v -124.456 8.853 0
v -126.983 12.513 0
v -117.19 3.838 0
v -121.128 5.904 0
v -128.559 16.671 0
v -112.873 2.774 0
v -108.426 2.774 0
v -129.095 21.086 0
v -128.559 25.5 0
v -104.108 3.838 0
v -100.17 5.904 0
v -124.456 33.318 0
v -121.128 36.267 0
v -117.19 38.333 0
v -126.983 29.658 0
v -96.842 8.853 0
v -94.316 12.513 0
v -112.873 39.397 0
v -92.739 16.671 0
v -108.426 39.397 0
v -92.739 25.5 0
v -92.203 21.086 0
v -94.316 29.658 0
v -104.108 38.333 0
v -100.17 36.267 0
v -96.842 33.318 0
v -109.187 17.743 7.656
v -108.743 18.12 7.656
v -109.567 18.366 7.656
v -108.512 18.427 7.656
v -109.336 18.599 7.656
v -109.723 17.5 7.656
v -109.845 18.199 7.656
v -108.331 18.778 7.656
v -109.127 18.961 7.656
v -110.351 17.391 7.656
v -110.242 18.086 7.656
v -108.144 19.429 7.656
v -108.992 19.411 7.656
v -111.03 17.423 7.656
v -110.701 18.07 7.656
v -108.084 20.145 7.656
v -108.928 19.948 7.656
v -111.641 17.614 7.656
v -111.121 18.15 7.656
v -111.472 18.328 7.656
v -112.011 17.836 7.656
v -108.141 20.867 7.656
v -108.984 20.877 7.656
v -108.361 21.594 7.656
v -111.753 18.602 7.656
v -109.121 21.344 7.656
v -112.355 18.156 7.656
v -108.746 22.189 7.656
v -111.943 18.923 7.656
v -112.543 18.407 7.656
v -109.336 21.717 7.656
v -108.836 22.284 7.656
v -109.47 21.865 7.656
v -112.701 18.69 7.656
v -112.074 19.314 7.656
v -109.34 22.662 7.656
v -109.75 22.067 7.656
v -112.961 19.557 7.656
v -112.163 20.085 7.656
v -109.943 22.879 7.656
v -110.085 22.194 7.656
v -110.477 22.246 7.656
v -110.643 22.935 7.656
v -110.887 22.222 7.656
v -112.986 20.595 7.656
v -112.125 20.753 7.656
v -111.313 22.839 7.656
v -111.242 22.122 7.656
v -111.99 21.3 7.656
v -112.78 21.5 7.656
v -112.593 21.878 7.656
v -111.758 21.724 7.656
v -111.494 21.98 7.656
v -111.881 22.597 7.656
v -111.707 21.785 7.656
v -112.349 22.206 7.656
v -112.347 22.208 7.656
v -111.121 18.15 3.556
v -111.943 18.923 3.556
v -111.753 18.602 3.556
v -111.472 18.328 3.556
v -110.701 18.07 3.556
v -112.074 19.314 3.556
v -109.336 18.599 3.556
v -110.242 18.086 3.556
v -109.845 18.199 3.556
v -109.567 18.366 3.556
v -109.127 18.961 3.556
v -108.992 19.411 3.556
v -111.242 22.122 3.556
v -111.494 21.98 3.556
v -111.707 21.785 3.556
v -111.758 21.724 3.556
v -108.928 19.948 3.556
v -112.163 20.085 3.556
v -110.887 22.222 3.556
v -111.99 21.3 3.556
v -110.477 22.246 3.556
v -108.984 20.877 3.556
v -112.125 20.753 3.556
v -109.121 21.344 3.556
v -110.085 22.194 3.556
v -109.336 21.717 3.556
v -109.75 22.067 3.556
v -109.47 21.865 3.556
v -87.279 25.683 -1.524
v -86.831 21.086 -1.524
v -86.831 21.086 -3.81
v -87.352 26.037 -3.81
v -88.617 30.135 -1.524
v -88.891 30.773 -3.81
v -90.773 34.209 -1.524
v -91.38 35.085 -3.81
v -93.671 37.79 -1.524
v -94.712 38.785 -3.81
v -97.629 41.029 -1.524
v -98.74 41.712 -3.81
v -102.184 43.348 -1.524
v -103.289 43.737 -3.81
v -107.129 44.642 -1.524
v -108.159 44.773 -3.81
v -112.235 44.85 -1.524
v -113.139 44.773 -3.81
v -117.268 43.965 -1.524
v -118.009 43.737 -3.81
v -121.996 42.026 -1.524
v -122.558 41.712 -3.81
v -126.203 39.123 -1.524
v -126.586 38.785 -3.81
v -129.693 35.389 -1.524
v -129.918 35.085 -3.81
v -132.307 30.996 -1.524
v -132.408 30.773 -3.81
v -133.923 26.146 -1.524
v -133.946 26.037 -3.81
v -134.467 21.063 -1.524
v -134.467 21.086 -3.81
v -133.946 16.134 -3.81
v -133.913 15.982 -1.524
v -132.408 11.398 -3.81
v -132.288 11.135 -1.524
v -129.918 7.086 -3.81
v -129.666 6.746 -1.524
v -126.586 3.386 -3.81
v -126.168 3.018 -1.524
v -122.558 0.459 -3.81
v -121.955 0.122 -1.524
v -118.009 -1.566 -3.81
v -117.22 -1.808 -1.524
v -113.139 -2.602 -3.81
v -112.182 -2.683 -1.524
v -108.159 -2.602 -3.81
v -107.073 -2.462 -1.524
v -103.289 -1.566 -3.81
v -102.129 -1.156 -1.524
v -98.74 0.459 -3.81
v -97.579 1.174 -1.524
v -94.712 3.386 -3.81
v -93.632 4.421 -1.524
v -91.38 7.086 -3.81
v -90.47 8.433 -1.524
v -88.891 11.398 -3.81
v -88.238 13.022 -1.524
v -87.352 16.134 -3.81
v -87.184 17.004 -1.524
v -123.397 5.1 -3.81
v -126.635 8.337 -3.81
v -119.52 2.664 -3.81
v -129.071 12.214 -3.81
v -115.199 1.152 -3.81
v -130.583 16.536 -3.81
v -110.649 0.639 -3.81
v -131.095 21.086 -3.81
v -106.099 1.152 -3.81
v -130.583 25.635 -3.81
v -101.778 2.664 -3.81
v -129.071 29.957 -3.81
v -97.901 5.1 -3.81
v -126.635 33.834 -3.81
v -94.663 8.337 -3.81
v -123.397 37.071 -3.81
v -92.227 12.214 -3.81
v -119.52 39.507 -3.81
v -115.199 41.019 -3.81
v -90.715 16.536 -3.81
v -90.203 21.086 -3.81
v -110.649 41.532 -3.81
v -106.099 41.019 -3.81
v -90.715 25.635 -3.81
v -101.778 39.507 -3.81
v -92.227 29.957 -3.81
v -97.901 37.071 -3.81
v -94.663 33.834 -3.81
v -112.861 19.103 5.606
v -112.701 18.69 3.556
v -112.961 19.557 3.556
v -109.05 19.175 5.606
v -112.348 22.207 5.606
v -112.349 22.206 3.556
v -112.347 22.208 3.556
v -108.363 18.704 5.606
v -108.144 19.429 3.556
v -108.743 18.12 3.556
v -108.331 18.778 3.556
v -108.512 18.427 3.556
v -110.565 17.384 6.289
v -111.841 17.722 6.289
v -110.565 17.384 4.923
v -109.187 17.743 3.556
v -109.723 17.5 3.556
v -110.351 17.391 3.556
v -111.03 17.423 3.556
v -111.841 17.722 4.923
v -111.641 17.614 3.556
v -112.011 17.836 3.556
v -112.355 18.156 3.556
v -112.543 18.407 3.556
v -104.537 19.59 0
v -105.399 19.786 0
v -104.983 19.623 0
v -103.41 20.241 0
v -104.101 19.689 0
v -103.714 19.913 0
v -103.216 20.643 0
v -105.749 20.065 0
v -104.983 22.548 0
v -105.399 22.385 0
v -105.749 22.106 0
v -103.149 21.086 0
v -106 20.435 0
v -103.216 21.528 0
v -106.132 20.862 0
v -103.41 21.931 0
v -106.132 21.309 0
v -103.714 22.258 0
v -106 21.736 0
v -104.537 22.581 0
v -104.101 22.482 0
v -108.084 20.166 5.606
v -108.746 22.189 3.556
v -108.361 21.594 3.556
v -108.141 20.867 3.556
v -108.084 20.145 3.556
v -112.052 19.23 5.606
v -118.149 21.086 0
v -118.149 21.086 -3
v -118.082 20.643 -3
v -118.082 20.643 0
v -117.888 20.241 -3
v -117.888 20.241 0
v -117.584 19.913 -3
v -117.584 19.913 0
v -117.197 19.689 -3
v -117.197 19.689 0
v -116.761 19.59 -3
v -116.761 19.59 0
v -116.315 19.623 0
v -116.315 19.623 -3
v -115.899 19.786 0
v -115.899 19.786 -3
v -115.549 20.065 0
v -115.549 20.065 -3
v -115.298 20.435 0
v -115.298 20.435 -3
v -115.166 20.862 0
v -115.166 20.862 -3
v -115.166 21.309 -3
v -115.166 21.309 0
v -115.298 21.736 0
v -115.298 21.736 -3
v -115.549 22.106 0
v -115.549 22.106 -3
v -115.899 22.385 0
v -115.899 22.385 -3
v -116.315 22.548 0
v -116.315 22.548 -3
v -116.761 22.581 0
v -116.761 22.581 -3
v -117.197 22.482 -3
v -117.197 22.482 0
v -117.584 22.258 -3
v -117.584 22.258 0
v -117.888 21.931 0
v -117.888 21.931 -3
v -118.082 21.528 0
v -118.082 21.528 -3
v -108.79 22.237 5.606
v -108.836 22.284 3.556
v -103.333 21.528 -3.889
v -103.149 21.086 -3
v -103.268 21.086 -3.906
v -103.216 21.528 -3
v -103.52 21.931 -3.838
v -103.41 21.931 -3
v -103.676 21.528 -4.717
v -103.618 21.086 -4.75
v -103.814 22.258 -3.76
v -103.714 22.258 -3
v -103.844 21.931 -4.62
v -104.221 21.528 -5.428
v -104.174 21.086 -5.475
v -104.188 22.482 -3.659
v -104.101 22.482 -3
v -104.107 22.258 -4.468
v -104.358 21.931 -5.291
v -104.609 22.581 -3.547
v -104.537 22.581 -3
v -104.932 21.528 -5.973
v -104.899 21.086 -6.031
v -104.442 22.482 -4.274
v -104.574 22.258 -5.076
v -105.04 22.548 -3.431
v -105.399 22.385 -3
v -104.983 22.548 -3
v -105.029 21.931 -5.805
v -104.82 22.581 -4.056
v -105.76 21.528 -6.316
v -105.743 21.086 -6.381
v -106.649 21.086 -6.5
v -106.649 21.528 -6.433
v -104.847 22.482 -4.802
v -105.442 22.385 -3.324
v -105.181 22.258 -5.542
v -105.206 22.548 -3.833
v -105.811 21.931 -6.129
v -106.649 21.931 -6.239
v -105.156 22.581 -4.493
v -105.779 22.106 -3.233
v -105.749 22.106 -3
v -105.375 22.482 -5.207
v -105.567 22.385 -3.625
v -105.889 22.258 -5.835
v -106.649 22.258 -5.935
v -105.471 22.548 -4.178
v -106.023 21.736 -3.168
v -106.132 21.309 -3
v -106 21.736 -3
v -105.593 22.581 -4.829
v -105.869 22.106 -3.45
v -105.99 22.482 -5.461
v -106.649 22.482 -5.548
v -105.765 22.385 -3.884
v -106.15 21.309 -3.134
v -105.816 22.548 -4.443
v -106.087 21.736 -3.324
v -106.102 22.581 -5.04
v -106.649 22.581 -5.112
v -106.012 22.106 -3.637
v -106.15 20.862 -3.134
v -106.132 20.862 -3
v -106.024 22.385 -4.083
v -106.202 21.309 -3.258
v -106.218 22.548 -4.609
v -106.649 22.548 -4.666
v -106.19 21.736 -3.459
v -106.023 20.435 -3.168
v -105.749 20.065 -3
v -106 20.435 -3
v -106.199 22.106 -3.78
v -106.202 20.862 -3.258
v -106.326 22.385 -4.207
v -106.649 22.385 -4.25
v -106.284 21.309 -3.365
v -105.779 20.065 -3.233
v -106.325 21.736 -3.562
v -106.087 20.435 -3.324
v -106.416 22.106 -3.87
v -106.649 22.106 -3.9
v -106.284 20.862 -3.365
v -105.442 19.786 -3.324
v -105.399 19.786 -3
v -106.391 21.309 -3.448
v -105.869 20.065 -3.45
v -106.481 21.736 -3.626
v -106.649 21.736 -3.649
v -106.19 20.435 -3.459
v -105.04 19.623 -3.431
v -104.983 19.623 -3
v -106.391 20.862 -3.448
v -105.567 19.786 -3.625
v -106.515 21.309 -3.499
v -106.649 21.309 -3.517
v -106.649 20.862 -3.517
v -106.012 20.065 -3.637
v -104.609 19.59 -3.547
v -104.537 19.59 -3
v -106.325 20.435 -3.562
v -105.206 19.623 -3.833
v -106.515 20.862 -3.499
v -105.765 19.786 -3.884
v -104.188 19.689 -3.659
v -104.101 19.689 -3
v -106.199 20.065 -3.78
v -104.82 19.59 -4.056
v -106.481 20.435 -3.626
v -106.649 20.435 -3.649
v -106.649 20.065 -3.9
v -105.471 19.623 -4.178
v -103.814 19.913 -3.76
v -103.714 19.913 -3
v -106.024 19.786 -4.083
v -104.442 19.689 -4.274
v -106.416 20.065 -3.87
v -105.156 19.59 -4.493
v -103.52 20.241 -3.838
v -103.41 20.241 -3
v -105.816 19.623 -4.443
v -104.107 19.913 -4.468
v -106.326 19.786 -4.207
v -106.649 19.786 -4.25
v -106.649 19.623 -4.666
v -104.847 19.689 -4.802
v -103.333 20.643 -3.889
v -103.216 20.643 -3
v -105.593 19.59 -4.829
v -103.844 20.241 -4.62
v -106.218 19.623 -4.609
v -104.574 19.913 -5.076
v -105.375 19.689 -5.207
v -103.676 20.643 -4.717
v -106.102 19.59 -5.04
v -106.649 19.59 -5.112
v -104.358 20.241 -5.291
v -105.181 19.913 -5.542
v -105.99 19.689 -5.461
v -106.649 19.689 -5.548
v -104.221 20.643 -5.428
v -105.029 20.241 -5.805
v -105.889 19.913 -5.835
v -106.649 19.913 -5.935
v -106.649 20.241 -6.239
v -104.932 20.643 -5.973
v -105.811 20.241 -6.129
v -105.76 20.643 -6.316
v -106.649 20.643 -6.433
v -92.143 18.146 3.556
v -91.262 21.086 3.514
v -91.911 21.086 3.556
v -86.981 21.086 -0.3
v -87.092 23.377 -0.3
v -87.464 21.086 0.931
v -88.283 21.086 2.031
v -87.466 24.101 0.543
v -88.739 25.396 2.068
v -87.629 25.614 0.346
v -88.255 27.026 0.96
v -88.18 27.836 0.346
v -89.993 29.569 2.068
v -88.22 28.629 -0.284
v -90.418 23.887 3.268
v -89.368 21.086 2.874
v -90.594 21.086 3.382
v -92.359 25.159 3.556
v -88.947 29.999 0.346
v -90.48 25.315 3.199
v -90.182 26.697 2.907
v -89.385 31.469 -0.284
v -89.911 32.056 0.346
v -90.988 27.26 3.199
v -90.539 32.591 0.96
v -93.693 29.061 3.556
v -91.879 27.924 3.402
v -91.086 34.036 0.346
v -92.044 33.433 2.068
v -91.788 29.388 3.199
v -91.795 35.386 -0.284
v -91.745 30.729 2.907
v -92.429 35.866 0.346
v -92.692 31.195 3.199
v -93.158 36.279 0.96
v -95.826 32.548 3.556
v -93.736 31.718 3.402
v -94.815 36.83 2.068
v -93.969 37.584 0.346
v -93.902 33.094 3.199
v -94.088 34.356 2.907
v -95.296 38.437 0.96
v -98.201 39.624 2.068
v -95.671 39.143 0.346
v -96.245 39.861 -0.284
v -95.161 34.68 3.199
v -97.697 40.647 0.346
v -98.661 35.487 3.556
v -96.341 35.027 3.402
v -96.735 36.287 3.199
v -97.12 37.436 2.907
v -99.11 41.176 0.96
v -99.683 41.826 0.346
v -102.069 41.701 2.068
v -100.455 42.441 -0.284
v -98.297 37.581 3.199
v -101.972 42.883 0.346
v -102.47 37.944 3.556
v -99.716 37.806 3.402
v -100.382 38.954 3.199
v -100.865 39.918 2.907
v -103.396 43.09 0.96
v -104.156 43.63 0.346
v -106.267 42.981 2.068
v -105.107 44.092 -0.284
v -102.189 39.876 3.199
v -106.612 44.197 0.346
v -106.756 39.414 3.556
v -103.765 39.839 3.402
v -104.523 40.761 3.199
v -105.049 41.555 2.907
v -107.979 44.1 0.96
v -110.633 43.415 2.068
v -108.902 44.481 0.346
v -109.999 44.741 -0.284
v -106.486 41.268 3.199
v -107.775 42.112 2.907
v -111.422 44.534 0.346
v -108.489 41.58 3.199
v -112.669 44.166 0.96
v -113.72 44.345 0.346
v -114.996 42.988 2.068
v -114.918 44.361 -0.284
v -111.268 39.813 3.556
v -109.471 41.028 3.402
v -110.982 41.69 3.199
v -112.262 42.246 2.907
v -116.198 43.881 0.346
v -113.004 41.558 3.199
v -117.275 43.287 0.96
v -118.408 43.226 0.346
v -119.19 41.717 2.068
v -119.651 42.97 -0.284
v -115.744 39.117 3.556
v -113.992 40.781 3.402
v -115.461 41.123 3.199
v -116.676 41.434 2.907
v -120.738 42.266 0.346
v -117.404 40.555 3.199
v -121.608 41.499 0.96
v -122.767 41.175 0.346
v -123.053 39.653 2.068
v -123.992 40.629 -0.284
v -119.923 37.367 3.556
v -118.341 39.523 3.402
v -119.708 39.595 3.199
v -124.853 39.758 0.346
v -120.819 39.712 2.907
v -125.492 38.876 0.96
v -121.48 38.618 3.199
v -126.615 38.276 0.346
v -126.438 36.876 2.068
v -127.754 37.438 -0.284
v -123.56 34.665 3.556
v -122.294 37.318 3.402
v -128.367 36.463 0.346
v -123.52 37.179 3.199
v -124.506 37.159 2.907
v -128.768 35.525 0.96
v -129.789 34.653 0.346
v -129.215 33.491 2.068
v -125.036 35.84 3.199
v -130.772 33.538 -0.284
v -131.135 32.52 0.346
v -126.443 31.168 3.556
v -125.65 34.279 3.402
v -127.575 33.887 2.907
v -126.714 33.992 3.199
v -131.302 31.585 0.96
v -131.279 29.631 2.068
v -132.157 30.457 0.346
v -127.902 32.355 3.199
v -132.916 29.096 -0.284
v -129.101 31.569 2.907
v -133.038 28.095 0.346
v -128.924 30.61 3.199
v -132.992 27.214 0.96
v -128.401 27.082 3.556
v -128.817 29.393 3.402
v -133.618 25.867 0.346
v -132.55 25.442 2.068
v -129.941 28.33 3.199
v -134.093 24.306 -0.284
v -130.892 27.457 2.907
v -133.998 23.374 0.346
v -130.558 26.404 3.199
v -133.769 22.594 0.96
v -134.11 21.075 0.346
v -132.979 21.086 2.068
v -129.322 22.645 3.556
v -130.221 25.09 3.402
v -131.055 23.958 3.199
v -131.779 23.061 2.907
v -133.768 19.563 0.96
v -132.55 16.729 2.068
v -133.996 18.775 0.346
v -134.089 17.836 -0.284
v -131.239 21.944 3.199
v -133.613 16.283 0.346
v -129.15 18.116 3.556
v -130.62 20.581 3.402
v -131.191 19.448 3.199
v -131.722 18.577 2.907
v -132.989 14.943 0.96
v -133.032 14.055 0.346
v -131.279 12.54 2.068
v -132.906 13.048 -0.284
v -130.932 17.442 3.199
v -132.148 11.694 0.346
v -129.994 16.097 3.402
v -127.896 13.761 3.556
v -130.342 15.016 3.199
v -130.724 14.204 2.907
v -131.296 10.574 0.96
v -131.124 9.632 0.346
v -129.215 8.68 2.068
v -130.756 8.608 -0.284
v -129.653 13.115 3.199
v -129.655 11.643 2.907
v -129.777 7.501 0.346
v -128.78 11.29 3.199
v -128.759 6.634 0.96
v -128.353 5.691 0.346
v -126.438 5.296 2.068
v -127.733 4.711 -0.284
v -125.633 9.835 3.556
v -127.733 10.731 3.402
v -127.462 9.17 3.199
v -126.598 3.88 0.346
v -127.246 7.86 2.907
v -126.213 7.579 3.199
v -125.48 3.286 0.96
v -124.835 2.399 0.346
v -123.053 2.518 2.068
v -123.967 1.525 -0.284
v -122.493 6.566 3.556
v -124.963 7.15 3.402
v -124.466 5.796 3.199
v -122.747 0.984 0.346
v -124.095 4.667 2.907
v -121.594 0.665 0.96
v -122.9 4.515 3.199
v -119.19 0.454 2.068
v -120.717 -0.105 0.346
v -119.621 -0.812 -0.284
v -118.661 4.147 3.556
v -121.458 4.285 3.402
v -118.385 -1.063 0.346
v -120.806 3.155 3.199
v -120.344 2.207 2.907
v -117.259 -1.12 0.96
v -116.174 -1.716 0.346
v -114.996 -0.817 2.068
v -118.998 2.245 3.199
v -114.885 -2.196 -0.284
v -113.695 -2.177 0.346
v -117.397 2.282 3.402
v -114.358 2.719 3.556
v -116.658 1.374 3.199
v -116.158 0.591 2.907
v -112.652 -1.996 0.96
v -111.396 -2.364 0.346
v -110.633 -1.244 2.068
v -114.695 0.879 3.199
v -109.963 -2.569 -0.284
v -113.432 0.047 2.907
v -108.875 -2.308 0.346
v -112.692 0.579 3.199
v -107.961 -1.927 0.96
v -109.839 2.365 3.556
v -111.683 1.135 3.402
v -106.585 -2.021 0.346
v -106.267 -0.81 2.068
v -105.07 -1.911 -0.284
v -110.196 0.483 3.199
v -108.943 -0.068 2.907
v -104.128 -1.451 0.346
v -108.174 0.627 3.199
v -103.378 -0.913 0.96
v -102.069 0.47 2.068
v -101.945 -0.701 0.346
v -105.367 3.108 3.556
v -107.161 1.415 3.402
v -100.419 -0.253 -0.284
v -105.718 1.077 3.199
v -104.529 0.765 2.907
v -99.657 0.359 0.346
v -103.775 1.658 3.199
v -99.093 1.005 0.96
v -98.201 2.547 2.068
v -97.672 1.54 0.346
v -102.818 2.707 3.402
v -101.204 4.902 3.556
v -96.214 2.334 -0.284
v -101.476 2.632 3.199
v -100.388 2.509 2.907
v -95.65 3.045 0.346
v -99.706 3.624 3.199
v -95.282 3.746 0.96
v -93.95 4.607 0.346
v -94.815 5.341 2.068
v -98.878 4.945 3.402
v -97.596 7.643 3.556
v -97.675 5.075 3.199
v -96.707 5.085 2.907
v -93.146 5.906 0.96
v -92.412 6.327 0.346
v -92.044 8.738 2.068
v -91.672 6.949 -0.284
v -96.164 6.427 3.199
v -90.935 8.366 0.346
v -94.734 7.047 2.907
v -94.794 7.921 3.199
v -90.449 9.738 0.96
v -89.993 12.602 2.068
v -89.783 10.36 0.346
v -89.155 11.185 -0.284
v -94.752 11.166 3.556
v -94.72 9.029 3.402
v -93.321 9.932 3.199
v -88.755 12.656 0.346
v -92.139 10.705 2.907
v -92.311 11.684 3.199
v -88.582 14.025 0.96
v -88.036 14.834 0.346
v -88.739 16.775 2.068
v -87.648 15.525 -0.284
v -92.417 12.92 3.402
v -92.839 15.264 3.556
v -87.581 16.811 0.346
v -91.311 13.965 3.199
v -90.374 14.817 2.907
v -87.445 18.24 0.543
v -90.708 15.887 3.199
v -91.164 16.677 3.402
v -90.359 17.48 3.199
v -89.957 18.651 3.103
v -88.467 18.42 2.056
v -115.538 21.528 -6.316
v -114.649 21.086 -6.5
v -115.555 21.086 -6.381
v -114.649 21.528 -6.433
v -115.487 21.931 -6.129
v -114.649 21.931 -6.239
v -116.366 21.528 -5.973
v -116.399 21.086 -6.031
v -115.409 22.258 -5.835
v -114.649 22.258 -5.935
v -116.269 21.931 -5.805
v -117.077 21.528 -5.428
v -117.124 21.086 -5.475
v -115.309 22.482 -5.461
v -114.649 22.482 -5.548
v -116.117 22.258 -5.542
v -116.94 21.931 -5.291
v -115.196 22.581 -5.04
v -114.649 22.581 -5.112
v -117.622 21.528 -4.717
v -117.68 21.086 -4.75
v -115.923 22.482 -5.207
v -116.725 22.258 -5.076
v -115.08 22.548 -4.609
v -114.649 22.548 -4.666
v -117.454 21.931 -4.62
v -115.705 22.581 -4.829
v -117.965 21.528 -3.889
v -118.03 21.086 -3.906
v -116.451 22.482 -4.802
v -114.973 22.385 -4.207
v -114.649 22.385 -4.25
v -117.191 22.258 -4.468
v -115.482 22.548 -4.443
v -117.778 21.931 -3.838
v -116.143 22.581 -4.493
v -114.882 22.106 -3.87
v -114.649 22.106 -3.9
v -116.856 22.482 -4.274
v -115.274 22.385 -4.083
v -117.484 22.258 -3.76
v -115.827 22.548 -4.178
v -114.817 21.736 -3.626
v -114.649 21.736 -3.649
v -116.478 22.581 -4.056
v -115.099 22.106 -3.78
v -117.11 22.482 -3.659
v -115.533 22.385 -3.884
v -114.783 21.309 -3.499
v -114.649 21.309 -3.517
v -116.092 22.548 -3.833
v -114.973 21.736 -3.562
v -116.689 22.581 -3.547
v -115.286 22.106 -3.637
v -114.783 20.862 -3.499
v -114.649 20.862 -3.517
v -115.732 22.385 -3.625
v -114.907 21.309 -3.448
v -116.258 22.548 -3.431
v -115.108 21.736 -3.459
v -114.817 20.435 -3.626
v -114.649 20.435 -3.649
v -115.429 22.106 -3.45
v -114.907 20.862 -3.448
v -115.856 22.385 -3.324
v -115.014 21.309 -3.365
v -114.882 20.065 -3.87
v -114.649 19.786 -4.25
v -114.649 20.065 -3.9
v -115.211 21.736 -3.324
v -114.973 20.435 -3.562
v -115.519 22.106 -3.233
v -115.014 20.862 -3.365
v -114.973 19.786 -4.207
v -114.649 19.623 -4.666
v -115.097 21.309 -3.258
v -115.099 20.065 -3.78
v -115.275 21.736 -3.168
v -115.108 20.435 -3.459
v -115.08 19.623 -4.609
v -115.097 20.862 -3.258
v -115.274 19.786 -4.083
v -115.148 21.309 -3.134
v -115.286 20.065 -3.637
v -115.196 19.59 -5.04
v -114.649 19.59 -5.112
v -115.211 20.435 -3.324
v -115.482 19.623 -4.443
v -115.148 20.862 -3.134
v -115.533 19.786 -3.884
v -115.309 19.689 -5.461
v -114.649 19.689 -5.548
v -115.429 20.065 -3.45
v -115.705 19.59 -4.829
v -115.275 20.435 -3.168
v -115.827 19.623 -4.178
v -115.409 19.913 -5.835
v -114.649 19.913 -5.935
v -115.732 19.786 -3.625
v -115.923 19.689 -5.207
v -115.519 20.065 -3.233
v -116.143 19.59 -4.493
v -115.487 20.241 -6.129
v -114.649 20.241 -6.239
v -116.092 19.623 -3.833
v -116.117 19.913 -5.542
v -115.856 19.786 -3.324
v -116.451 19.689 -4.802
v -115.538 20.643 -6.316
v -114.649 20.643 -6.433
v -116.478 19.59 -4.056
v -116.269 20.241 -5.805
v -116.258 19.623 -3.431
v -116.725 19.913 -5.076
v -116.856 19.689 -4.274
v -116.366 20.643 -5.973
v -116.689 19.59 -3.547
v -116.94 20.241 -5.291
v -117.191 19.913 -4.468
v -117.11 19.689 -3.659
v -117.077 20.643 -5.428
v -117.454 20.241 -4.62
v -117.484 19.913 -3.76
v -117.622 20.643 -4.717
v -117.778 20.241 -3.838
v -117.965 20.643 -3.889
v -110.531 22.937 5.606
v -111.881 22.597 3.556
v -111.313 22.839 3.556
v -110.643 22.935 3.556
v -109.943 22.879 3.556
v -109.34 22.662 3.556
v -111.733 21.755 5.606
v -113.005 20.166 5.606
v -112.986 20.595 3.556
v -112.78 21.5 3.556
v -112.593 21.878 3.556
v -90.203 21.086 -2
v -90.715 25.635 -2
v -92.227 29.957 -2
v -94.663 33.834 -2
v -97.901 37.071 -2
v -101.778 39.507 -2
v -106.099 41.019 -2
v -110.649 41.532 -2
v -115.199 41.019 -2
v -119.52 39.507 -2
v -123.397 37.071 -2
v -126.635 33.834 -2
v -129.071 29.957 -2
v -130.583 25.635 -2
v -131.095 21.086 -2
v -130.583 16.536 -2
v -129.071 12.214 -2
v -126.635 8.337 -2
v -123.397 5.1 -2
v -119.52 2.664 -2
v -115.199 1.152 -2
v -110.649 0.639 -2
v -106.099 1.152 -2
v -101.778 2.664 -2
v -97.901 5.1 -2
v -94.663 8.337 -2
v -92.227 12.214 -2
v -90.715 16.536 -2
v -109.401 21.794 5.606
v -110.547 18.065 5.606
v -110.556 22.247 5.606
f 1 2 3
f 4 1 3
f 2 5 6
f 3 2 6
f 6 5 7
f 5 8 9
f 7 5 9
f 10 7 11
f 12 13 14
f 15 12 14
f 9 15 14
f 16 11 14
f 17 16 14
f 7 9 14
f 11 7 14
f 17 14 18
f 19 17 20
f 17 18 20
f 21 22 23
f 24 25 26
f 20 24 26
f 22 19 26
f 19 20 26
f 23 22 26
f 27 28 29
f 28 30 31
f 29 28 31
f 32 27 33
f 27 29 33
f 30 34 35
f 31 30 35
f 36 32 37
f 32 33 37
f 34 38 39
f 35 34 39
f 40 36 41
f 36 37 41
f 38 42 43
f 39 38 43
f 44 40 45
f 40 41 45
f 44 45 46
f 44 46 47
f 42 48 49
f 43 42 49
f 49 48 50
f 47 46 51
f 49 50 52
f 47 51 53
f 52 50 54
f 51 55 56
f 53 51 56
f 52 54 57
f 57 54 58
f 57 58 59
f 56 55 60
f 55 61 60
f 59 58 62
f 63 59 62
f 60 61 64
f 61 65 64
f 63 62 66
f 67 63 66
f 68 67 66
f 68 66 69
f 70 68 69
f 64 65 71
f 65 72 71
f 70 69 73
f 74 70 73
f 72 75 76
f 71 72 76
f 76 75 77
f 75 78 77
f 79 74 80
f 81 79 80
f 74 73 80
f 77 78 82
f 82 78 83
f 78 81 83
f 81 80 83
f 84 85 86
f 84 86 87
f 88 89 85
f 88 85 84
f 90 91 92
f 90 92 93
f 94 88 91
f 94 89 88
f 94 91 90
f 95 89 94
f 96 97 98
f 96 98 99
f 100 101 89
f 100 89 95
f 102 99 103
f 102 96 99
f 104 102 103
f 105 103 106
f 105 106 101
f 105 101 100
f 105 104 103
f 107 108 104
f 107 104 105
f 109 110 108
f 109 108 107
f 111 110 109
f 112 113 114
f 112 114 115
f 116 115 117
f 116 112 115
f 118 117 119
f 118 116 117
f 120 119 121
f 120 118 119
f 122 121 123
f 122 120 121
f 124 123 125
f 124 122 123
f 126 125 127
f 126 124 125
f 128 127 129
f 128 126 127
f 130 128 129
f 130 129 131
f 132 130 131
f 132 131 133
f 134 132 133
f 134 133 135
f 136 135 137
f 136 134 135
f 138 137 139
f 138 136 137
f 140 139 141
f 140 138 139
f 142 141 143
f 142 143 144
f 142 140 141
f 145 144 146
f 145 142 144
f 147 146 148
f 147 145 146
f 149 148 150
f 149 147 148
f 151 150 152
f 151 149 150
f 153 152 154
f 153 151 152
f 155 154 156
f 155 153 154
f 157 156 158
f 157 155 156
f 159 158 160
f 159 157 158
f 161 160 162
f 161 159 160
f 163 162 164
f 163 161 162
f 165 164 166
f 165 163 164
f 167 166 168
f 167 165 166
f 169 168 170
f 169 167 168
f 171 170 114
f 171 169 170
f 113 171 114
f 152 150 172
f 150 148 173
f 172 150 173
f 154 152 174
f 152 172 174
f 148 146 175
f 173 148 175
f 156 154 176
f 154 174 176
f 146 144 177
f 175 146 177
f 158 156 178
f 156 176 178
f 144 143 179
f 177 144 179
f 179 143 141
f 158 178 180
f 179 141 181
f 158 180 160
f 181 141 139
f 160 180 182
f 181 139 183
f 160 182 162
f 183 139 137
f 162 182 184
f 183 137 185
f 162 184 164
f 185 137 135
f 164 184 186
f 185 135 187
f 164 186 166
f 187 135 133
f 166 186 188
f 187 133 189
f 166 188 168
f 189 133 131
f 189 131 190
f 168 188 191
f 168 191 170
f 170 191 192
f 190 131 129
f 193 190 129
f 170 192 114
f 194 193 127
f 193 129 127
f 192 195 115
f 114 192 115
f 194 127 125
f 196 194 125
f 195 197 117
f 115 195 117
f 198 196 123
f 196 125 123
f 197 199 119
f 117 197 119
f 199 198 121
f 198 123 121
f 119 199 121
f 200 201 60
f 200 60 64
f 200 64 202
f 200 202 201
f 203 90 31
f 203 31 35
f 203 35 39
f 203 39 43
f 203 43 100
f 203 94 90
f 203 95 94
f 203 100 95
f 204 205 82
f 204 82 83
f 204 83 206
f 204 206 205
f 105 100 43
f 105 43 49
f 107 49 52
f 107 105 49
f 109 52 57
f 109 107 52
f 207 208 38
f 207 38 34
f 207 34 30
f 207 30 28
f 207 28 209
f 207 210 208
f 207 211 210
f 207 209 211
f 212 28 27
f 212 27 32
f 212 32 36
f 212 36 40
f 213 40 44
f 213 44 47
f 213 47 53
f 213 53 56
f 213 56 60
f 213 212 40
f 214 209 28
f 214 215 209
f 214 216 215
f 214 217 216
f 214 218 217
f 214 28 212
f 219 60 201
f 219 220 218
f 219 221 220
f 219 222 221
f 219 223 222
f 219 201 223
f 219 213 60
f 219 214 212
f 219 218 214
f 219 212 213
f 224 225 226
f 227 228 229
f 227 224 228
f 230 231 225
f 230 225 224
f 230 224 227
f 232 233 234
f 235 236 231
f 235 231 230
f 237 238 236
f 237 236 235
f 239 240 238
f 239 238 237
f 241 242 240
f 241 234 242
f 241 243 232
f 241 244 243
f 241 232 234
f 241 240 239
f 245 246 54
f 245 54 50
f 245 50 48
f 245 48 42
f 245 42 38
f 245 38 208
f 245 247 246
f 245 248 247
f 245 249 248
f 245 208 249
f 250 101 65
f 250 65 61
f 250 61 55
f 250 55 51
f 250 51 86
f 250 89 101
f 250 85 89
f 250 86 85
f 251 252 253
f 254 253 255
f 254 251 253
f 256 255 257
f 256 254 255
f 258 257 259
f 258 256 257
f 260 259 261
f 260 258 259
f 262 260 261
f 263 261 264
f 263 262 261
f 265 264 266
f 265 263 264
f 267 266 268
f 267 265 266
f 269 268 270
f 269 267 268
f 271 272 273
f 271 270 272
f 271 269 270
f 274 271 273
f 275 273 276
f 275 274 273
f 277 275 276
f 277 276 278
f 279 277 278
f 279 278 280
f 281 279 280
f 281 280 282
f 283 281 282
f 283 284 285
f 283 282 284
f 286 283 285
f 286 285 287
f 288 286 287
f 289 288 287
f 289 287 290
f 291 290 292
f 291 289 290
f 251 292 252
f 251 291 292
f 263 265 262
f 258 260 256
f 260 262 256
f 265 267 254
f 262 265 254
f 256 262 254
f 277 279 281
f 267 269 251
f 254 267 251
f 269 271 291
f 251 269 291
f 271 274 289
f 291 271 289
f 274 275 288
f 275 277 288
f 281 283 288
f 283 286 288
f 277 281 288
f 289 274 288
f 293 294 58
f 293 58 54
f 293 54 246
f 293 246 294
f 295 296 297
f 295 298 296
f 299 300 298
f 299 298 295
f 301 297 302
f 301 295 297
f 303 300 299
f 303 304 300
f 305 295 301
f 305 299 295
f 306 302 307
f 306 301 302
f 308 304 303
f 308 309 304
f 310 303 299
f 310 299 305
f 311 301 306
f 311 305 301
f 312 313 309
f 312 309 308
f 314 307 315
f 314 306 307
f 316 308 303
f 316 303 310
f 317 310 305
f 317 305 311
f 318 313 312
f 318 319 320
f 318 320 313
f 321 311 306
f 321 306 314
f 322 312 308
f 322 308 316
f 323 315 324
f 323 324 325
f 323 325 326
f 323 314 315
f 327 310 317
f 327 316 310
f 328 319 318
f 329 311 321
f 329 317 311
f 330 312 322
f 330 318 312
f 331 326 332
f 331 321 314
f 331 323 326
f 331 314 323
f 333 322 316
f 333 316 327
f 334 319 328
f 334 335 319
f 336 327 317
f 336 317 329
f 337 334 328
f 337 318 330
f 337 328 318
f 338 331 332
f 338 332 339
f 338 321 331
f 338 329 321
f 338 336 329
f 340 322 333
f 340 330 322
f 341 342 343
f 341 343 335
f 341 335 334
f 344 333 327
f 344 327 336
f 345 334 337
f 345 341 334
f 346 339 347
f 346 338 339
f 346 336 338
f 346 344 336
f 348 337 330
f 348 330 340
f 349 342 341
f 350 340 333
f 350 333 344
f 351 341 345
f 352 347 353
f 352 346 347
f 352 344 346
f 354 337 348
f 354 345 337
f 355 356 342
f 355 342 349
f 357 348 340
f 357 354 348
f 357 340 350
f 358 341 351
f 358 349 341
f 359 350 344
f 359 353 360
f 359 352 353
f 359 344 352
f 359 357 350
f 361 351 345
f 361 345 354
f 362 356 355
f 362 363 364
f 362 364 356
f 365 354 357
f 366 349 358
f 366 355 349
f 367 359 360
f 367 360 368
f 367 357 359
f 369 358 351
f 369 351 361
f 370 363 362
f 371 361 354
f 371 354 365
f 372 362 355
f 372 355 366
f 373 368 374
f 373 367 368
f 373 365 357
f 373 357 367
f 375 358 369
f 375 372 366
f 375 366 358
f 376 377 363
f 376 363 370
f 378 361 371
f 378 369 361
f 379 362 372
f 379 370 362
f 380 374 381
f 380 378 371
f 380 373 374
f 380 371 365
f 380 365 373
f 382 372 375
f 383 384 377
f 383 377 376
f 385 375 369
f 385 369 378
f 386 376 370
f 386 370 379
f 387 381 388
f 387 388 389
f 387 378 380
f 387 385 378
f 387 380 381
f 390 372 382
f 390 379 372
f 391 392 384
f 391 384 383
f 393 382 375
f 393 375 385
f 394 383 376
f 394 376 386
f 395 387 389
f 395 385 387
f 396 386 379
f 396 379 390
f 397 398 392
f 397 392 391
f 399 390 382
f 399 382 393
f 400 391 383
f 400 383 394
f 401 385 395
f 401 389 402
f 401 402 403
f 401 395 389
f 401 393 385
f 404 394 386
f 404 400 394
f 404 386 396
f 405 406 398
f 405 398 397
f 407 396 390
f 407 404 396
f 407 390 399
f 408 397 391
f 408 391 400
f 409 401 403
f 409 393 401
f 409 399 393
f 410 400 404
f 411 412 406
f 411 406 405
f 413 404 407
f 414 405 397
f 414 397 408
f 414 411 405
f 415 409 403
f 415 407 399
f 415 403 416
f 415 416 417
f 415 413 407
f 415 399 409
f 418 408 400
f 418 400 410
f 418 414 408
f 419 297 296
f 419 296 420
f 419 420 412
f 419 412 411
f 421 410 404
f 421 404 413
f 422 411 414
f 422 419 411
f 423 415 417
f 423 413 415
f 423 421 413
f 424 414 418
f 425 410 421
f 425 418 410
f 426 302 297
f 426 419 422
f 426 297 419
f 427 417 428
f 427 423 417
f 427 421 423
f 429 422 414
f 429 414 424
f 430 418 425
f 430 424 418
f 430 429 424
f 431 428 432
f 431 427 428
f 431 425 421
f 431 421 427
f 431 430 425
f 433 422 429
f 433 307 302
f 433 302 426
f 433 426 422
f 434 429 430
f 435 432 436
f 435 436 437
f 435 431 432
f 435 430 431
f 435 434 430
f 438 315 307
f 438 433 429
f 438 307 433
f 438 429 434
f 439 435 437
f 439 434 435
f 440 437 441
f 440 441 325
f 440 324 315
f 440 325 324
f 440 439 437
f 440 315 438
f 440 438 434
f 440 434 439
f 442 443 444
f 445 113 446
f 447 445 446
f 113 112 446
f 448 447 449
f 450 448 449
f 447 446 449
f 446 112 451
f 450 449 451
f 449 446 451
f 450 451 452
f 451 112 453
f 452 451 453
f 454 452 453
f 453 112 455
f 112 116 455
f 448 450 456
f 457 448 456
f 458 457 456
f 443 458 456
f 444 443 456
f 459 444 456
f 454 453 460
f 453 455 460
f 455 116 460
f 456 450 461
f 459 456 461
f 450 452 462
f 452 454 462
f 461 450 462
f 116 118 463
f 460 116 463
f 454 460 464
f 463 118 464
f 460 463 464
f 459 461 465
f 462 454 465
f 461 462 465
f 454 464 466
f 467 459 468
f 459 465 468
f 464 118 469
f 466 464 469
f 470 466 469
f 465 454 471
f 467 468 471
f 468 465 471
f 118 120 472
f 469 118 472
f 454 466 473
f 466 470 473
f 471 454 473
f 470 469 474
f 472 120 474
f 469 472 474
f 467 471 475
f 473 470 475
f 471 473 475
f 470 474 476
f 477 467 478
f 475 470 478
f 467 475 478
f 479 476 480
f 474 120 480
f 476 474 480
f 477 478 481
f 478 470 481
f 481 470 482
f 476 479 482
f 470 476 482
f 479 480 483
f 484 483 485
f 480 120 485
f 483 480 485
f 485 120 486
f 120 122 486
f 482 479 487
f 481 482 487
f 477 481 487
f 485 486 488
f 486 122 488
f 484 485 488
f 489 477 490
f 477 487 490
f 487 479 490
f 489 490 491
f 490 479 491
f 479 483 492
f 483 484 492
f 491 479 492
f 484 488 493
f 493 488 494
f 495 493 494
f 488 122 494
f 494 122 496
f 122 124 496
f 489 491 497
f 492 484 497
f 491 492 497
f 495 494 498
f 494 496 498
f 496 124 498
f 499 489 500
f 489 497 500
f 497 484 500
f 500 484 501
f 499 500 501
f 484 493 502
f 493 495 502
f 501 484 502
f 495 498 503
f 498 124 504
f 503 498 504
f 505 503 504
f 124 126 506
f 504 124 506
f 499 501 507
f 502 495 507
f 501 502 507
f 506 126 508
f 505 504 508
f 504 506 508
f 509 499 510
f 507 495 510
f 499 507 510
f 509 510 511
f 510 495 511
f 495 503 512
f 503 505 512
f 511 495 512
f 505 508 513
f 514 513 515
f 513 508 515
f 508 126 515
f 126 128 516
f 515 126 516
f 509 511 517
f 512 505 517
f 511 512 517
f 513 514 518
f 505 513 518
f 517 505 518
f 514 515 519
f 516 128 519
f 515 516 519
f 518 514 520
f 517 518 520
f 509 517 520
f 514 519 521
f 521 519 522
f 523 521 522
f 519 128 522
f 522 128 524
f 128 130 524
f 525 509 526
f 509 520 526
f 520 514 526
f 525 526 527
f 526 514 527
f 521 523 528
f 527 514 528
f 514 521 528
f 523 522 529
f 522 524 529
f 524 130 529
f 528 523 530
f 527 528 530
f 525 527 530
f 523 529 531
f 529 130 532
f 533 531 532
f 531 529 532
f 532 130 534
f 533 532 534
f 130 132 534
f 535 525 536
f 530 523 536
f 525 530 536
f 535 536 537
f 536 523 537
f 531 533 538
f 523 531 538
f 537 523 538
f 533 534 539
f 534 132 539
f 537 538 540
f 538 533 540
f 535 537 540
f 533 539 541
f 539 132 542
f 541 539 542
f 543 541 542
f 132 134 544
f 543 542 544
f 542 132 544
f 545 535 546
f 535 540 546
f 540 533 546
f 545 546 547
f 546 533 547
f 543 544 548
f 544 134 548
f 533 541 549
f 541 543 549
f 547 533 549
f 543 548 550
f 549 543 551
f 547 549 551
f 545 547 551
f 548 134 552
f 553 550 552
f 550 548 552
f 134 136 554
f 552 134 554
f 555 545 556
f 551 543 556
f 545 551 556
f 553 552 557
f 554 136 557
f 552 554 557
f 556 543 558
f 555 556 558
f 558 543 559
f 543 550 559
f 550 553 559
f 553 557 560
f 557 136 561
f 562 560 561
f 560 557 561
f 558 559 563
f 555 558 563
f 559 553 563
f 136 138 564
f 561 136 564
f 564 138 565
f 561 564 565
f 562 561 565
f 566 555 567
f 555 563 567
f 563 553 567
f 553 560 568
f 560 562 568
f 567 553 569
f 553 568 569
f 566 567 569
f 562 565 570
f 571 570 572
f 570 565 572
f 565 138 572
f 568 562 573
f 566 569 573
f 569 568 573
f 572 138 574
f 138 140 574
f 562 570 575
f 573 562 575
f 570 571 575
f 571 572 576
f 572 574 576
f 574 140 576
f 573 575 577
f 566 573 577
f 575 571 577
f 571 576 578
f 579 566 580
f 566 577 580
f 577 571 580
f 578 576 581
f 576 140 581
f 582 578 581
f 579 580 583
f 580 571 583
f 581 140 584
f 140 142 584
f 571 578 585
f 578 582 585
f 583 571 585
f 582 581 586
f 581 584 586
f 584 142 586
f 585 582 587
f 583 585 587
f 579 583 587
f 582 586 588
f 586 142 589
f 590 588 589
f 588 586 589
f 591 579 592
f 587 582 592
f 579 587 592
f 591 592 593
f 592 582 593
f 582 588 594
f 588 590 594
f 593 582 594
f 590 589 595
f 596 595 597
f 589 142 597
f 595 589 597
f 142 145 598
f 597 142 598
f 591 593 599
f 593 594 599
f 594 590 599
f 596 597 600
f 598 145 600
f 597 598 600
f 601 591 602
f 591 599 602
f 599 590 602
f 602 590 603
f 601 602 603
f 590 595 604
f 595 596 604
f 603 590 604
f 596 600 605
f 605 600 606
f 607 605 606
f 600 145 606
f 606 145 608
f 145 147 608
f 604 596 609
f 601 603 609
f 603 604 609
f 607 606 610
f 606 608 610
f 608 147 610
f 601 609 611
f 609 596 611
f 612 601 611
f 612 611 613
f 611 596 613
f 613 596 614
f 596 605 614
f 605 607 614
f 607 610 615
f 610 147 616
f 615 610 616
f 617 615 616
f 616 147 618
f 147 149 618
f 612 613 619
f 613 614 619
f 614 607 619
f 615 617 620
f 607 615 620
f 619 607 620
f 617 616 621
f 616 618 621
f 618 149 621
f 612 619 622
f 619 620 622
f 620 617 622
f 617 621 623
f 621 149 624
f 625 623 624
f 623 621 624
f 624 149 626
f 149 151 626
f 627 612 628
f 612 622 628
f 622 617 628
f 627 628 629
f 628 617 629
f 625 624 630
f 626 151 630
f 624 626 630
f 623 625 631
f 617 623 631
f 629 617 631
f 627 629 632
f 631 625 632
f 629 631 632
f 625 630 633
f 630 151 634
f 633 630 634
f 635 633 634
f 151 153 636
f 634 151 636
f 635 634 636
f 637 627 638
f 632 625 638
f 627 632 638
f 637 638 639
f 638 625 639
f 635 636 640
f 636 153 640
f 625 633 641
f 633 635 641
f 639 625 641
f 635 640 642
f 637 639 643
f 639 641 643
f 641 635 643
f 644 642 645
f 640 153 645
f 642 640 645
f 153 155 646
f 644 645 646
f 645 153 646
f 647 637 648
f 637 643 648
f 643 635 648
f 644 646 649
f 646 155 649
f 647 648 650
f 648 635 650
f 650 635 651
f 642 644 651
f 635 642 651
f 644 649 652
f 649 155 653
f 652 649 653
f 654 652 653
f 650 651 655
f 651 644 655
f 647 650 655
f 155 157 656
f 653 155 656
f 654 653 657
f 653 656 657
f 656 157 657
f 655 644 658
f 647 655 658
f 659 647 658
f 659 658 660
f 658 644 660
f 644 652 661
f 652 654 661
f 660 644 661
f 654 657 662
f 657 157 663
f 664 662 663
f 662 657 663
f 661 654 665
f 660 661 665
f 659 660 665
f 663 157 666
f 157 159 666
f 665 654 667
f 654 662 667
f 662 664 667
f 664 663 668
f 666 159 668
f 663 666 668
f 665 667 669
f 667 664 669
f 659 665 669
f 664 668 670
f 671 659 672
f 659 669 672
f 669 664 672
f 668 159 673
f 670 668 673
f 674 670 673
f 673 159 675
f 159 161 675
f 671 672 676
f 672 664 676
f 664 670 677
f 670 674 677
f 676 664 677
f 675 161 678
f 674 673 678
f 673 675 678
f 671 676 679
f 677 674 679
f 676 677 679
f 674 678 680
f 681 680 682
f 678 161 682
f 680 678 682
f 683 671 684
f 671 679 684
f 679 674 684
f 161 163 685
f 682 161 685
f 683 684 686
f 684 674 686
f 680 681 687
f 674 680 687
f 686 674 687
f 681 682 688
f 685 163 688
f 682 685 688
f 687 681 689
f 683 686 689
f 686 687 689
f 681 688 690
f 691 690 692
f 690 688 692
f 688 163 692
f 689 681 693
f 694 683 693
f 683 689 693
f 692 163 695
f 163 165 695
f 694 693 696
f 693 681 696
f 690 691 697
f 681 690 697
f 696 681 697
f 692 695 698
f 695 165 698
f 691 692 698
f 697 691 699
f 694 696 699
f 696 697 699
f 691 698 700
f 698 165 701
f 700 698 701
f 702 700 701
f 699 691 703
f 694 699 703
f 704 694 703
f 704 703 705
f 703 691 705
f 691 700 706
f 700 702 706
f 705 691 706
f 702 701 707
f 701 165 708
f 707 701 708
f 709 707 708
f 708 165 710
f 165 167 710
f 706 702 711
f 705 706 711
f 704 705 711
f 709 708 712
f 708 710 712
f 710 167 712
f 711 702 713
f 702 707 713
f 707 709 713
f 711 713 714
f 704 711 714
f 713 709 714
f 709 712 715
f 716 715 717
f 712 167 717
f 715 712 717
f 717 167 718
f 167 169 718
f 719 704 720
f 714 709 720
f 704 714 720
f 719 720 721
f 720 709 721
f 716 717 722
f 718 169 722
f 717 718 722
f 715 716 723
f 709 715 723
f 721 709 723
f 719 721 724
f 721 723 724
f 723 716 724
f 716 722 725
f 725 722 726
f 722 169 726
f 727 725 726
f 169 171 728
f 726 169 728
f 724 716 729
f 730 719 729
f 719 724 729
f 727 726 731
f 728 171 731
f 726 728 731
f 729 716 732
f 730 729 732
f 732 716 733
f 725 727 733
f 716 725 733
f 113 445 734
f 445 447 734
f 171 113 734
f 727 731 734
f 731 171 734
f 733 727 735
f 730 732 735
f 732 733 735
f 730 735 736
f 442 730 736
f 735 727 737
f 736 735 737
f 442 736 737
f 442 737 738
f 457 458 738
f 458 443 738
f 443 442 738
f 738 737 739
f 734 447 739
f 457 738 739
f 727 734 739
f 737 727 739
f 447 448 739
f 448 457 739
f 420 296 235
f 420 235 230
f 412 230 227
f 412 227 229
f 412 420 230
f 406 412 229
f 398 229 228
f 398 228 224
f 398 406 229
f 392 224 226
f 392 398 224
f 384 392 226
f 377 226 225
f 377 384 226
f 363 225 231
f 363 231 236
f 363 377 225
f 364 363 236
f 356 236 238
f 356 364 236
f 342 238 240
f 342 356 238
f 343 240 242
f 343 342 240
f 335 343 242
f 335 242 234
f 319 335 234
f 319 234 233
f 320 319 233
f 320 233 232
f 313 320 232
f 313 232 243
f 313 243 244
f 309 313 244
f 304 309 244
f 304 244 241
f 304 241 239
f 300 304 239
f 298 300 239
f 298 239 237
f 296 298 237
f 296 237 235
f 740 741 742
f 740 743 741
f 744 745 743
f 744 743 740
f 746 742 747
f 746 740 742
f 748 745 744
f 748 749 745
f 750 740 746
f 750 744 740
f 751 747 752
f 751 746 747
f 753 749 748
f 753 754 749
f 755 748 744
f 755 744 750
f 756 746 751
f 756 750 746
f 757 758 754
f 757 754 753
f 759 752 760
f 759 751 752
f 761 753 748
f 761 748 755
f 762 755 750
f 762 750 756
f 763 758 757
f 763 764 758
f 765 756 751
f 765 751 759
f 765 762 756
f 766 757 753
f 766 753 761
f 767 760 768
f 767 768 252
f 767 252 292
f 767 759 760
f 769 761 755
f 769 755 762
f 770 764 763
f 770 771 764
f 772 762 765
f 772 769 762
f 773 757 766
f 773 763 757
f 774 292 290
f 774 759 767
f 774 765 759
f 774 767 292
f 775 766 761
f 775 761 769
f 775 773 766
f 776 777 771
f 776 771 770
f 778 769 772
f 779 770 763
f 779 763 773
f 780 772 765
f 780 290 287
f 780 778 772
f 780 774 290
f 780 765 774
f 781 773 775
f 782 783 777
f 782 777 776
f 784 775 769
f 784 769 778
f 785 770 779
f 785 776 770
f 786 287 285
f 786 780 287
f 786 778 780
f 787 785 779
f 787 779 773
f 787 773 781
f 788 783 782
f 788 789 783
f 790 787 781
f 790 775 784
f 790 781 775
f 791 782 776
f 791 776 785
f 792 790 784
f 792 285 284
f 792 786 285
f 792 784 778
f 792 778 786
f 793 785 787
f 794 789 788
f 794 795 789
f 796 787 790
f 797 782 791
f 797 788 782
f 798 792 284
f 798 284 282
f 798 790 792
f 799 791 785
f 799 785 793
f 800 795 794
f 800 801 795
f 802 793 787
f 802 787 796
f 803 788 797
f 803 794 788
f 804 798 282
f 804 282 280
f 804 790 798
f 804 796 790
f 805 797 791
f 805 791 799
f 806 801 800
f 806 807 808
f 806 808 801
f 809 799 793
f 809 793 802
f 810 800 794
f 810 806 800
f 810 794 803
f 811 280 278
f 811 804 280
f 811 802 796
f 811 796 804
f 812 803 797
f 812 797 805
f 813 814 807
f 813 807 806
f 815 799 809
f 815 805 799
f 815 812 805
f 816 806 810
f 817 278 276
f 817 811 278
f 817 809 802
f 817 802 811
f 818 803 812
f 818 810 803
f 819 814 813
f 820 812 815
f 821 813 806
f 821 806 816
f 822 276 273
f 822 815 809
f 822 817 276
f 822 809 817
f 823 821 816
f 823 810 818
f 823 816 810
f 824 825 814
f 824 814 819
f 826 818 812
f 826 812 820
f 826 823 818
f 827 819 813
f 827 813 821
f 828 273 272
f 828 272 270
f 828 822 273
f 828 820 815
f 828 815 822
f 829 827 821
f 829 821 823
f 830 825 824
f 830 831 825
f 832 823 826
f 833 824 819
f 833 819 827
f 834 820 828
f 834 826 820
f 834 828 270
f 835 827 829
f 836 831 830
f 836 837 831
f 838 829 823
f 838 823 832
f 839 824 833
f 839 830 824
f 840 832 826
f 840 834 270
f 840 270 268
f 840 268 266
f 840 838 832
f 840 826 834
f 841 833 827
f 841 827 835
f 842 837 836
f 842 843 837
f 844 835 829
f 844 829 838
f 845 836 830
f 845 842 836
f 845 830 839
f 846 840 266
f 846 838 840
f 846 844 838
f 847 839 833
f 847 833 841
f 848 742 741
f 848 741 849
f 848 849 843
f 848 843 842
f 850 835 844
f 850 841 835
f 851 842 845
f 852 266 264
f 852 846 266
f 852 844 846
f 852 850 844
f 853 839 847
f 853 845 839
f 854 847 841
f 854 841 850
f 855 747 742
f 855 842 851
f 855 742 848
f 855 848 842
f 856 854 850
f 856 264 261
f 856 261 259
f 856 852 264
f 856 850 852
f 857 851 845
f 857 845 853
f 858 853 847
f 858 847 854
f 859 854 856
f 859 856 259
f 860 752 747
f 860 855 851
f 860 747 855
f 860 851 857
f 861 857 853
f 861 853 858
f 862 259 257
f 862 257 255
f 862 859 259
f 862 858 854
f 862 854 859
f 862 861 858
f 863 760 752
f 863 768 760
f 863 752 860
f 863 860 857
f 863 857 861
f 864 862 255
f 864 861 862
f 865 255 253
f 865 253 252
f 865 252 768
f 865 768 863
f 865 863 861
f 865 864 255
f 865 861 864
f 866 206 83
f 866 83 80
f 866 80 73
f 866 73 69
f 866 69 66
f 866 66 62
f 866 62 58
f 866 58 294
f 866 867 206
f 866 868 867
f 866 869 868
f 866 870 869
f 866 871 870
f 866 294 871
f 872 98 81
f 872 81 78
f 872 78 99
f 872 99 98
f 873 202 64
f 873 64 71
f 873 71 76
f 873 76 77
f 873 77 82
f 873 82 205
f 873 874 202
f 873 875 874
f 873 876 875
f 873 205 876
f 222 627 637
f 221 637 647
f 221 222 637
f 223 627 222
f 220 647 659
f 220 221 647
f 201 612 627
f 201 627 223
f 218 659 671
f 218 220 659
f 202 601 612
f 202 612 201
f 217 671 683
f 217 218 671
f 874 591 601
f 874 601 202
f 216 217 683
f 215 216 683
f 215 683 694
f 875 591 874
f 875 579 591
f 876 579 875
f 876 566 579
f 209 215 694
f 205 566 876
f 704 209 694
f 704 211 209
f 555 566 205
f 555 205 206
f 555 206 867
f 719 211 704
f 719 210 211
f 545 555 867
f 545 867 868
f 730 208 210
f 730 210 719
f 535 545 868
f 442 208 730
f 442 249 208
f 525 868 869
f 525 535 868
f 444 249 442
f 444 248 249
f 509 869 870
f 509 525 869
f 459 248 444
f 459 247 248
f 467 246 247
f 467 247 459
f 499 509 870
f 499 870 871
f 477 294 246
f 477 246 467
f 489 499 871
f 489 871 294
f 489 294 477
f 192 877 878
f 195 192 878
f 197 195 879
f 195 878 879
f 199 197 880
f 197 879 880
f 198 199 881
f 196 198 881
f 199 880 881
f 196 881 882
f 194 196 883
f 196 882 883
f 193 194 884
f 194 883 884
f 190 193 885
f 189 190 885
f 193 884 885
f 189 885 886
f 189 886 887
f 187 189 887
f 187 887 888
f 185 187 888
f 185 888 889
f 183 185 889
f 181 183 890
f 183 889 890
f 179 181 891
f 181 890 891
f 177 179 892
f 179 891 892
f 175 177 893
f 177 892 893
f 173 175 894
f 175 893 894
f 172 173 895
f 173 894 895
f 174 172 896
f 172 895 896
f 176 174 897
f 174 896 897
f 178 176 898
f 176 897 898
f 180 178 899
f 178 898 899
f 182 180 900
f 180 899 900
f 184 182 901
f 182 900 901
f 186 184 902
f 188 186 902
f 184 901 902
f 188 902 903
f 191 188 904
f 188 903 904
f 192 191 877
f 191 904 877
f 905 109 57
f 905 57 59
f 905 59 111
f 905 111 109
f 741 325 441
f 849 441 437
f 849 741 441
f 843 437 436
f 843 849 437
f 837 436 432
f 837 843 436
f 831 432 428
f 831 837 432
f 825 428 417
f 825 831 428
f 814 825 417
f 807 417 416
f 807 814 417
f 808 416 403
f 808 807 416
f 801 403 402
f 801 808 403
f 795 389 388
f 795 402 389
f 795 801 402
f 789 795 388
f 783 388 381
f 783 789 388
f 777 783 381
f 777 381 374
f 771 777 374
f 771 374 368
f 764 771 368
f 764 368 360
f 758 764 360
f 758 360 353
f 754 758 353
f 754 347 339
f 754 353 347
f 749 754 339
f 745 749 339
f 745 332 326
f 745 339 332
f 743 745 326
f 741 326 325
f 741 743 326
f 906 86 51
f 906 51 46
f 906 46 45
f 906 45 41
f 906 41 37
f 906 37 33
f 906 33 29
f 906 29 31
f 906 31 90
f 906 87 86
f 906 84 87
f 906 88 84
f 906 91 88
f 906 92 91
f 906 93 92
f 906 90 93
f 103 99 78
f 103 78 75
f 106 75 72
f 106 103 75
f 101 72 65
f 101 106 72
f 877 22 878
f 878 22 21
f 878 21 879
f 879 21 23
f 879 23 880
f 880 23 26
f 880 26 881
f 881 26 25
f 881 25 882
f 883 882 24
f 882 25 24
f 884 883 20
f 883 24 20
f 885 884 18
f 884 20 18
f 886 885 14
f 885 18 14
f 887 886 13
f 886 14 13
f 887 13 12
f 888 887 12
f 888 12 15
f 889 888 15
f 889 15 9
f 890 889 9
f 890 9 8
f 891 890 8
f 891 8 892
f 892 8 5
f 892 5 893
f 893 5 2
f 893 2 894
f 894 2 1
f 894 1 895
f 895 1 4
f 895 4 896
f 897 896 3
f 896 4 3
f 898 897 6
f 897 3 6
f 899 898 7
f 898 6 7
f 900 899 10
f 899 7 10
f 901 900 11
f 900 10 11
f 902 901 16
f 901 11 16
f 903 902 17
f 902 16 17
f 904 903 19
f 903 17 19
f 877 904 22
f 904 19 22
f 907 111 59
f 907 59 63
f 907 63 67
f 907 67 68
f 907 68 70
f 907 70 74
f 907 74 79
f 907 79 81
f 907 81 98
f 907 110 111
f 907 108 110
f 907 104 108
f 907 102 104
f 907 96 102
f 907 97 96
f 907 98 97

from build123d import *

# Parameters (mm, degrees)
F0_R      = 23.8176620727
F0_R_2    = 20.4464074417
F1_DEPTH  = 3.81
F2_DEPTH  = 3.556
F3_DEPTH  = 3.556
F5_R      = 5.08
F6_SIZE   = 2
F9_R      = 1.5
F12_DEPTH = 4.1


with BuildPart() as f1:
    # F0 (on Top) → F1 (new body)
    with BuildSketch(Plane.XY):
        with Locations((-110.6490343809, 21.0855230689)):
            Circle(F0_R)
        with Locations((-110.6490343809, 21.0855230689)):
            Circle(F0_R_2, mode=Mode.SUBTRACT)
    extrude(amount=-F1_DEPTH)


with BuildPart() as f2:
    # F0 (on Top) → F2 (new body)
    with BuildSketch(Plane.XY):
        with Locations((-110.6490343809, 21.0855230689)):
            Circle(F0_R_2)
    extrude(amount=F2_DEPTH)


with BuildPart() as f3:
    # F0 (on Top) → F3 (new body)
    with BuildSketch(Plane.XY):
        with Locations((-110.6490343809, 21.0855230689)):
            Circle(F0_R)
        with Locations((-110.6490343809, 21.0855230689)):
            Circle(F0_R_2, mode=Mode.SUBTRACT)
    extrude(amount=F3_DEPTH)


with BuildPart() as f1_1:
    add(f1.part)

    # F4: union F2, F3
    add(f2.part)
    add(f3.part)

    # F5
    f5_edges = [f1_1.edges().sort_by_distance(p)[0] for p in [
        (-134.466696, 21.085523, 3.556),
    ]]
    fillet(f5_edges, radius=F5_R)

    # F6
    f6_edges = [f1_1.edges().sort_by_distance(p)[0] for p in [
        (-131.095442, 21.085523, 0),
    ]]
    chamfer(f6_edges, length=F6_SIZE)

    # F11 (on face) → F12 (join)
    with BuildSketch(Plane.XY.offset(3.556)):
        with BuildLine():
            add(Edge.make_bspline(
                [(-112.3472333381, 22.208395905), (-111.6923218171, 22.9368774647), (-110.5309792653, 22.9368774647)],
                knots=[0.0017264962, 0.0017264962, 0.0017264962, 1, 1, 1], degree=2))
            Line((-112.3472333381, 22.208395905), (-111.7074051084, 21.7853325556))
            add(Edge.make_bspline(
                [(-110.5559975679, 22.247310498), (-111.3039935604, 22.247310498), (-111.7074051084, 21.7853325556)],
                knots=[0, 0, 0, 0.9398177205, 0.9398177205, 0.9398177205], degree=2))
            add(Edge.make_bspline(
                [(-109.4699325004, 21.8651616778), (-109.8709274196, 22.247310498), (-110.5559975679, 22.247310498)],
                knots=[0.150922206, 0.150922206, 0.150922206, 1, 1, 1], degree=2))
            Line((-109.4699325004, 21.8651616778), (-108.8357851326, 22.2844687622))
            add(Edge.make_bspline(
                [(-110.5309792653, 22.9368774647), (-109.4826148396, 22.9368774647), (-108.8357851326, 22.2844687622)],
                knots=[0, 0, 0, 0.9337916198, 0.9337916198, 0.9337916198], degree=2))
        make_face()
        with BuildLine():
            add(Edge.make_bspline(
                [(-108.8357851326, 22.2844687622), (-108.789923137, 22.2382112005), (-108.7460797359, 22.1886738512)],
                knots=[0.9337916198, 0.9337916198, 0.9337916198, 1, 1, 1], degree=2))
            Line((-108.8357851326, 22.2844687622), (-109.4699325004, 21.8651616778))
            add(Edge.make_bspline(
                [(-109.3363553139, 21.7172352107), (-109.3986563015, 21.7972353424), (-109.4699325004, 21.8651616778)],
                knots=[0, 0, 0, 0.150922206, 0.150922206, 0.150922206], degree=2))
            add(Edge.make_bspline(
                [(-108.9235533203, 20.1661004467), (-108.9235533203, 21.1871599234), (-109.3363553139, 21.7172352107)],
                knots=[0, 0, 0, 1, 1, 1], degree=2))
            add(Edge.make_bspline(
                [(-108.9284211469, 19.9478296004), (-108.9235533203, 20.0540332643), (-108.9235533203, 20.1661004467)],
                knots=[0.8914082935, 0.8914082935, 0.8914082935, 1, 1, 1], degree=2))
            Line((-108.9284211469, 19.9478296004), (-108.143660581, 19.4289349687))
            add(Edge.make_bspline(
                [(-108.0838765377, 20.1661004467), (-108.0838765377, 19.7714552689), (-108.143660581, 19.4289349687)],
                knots=[0, 0, 0, 0.3011791634, 0.3011791634, 0.3011791634], degree=2))
            add(Edge.make_bspline(
                [(-108.7460797359, 22.1886738512), (-108.0838765377, 21.4404702377), (-108.0838765377, 20.1661004467)],
                knots=[0, 0, 0, 1, 1, 1], degree=2))
        make_face()
        with BuildLine():
            Line((-112.1627655318, 20.0846229192), (-112.9612111267, 19.5566795556))
            add(Edge.make_bspline(
                [(-112.7013170199, 18.6900205905), (-112.8898541973, 19.0816725622), (-112.9612111267, 19.5566795556)],
                knots=[0, 0, 0, 0.6215232964, 0.6215232964, 0.6215232964], degree=2))
            add(Edge.make_bspline(
                [(-111.8413128664, 17.7221250069), (-112.3979701003, 18.0598720926), (-112.7013170199, 18.6900205905)],
                knots=[0, 0, 0, 1, 1, 1], degree=2))
            add(Edge.make_bspline(
                [(-110.5653794314, 17.3843779212), (-111.2846556325, 17.3843779212), (-111.8413128664, 17.7221250069)],
                knots=[0, 0, 0, 1, 1, 1], degree=2))
            add(Edge.make_bspline(
                [(-108.7429524481, 18.1200723834), (-109.4020283584, 17.3843779212), (-110.5653794314, 17.3843779212)],
                knots=[0, 0, 0, 1, 1, 1], degree=2))
            add(Edge.make_bspline(
                [(-108.143660581, 19.4289349687), (-108.282376469, 18.6341910029), (-108.7429524481, 18.1200723834)],
                knots=[0.3011791634, 0.3011791634, 0.3011791634, 1, 1, 1], degree=2))
            Line((-108.143660581, 19.4289349687), (-108.9284211469, 19.9478296004))
            add(Edge.make_bspline(
                [(-109.3363553139, 18.5993292434), (-108.9683801932, 19.0760242862), (-108.9284211469, 19.9478296004)],
                knots=[0, 0, 0, 0.8914082935, 0.8914082935, 0.8914082935], degree=2))
            add(Edge.make_bspline(
                [(-110.5466157045, 18.0645630244), (-109.7491573076, 18.0645630244), (-109.3363553139, 18.5993292434)],
                knots=[0, 0, 0, 1, 1, 1], degree=2))
            add(Edge.make_bspline(
                [(-111.7529669852, 18.6016747093), (-111.3425104574, 18.0645630244), (-110.5466157045, 18.0645630244)],
                knots=[0, 0, 0, 1, 1, 1], degree=2))
            add(Edge.make_bspline(
                [(-112.1627655318, 20.0846229192), (-112.1469896256, 19.1172814787), (-111.7529669852, 18.6016747093)],
                knots=[0.0400380705, 0.0400380705, 0.0400380705, 1, 1, 1], degree=2))
        make_face()
        with BuildLine():
            Line((-111.7074051084, 21.7853325556), (-112.3472333381, 22.208395905))
            add(Edge.make_bspline(
                [(-112.3494971389, 22.2058739343), (-112.3483659959, 22.2071360091), (-112.3472333381, 22.208395905)],
                knots=[0, 0, 0, 0.0017264962, 0.0017264962, 0.0017264962], degree=2))
            add(Edge.make_bspline(
                [(-113.0046639394, 20.1661004467), (-113.0046639394, 21.4748704038), (-112.3494971389, 22.2058739343)],
                knots=[0, 0, 0, 1, 1, 1], degree=2))
            add(Edge.make_bspline(
                [(-112.9612111267, 19.5566795556), (-113.0046639394, 19.8459351347), (-113.0046639394, 20.1661004467)],
                knots=[0.6215232964, 0.6215232964, 0.6215232964, 1, 1, 1], degree=2))
            Line((-112.9612111267, 19.5566795556), (-112.1627655318, 20.0846229192))
            add(Edge.make_bspline(
                [(-112.163423513, 20.1661004467), (-112.163423513, 20.1249687742), (-112.1627655318, 20.0846229192)],
                knots=[0, 0, 0, 0.0400380705, 0.0400380705, 0.0400380705], degree=2))
            add(Edge.make_bspline(
                [(-111.7576579169, 21.7242716083), (-112.163423513, 21.2012327186), (-112.163423513, 20.1661004467)],
                knots=[0, 0, 0, 1, 1, 1], degree=2))
            add(Edge.make_bspline(
                [(-111.7074051084, 21.7853325556), (-111.7332380184, 21.755749281), (-111.7576579169, 21.7242716083)],
                knots=[0.9398177205, 0.9398177205, 0.9398177205, 1, 1, 1], degree=2))
        make_face()
    extrude(amount=F12_DEPTH)


with BuildPart() as f10:
    # F10: sweep along a path in F8
    with BuildLine(Plane.XZ.offset(-21.0855230689)) as f10_path:
        Line((-104.6490343809, 0), (-104.6490343809, -3))
        ThreePointArc((-104.6490343809, -3), (-105.2348208185, -4.4142135624), (-106.6490343809, -5))
        Line((-106.6490343809, -5), (-114.6490343809, -5))
        ThreePointArc((-114.6490343809, -5), (-116.0632479433, -4.4142135624), (-116.6490343809, -3))
        Line((-116.6490343809, -3), (-116.6490343809, 0))
    # F9 (on face) → F10 (sweep)
    with BuildSketch(Plane.XY):
        with Locations((-104.6490343809, 21.0855230689)):
            Circle(F9_R)
    sweep(path=f10_path.line)


solid = Compound([f1_1.part, f10.part])
